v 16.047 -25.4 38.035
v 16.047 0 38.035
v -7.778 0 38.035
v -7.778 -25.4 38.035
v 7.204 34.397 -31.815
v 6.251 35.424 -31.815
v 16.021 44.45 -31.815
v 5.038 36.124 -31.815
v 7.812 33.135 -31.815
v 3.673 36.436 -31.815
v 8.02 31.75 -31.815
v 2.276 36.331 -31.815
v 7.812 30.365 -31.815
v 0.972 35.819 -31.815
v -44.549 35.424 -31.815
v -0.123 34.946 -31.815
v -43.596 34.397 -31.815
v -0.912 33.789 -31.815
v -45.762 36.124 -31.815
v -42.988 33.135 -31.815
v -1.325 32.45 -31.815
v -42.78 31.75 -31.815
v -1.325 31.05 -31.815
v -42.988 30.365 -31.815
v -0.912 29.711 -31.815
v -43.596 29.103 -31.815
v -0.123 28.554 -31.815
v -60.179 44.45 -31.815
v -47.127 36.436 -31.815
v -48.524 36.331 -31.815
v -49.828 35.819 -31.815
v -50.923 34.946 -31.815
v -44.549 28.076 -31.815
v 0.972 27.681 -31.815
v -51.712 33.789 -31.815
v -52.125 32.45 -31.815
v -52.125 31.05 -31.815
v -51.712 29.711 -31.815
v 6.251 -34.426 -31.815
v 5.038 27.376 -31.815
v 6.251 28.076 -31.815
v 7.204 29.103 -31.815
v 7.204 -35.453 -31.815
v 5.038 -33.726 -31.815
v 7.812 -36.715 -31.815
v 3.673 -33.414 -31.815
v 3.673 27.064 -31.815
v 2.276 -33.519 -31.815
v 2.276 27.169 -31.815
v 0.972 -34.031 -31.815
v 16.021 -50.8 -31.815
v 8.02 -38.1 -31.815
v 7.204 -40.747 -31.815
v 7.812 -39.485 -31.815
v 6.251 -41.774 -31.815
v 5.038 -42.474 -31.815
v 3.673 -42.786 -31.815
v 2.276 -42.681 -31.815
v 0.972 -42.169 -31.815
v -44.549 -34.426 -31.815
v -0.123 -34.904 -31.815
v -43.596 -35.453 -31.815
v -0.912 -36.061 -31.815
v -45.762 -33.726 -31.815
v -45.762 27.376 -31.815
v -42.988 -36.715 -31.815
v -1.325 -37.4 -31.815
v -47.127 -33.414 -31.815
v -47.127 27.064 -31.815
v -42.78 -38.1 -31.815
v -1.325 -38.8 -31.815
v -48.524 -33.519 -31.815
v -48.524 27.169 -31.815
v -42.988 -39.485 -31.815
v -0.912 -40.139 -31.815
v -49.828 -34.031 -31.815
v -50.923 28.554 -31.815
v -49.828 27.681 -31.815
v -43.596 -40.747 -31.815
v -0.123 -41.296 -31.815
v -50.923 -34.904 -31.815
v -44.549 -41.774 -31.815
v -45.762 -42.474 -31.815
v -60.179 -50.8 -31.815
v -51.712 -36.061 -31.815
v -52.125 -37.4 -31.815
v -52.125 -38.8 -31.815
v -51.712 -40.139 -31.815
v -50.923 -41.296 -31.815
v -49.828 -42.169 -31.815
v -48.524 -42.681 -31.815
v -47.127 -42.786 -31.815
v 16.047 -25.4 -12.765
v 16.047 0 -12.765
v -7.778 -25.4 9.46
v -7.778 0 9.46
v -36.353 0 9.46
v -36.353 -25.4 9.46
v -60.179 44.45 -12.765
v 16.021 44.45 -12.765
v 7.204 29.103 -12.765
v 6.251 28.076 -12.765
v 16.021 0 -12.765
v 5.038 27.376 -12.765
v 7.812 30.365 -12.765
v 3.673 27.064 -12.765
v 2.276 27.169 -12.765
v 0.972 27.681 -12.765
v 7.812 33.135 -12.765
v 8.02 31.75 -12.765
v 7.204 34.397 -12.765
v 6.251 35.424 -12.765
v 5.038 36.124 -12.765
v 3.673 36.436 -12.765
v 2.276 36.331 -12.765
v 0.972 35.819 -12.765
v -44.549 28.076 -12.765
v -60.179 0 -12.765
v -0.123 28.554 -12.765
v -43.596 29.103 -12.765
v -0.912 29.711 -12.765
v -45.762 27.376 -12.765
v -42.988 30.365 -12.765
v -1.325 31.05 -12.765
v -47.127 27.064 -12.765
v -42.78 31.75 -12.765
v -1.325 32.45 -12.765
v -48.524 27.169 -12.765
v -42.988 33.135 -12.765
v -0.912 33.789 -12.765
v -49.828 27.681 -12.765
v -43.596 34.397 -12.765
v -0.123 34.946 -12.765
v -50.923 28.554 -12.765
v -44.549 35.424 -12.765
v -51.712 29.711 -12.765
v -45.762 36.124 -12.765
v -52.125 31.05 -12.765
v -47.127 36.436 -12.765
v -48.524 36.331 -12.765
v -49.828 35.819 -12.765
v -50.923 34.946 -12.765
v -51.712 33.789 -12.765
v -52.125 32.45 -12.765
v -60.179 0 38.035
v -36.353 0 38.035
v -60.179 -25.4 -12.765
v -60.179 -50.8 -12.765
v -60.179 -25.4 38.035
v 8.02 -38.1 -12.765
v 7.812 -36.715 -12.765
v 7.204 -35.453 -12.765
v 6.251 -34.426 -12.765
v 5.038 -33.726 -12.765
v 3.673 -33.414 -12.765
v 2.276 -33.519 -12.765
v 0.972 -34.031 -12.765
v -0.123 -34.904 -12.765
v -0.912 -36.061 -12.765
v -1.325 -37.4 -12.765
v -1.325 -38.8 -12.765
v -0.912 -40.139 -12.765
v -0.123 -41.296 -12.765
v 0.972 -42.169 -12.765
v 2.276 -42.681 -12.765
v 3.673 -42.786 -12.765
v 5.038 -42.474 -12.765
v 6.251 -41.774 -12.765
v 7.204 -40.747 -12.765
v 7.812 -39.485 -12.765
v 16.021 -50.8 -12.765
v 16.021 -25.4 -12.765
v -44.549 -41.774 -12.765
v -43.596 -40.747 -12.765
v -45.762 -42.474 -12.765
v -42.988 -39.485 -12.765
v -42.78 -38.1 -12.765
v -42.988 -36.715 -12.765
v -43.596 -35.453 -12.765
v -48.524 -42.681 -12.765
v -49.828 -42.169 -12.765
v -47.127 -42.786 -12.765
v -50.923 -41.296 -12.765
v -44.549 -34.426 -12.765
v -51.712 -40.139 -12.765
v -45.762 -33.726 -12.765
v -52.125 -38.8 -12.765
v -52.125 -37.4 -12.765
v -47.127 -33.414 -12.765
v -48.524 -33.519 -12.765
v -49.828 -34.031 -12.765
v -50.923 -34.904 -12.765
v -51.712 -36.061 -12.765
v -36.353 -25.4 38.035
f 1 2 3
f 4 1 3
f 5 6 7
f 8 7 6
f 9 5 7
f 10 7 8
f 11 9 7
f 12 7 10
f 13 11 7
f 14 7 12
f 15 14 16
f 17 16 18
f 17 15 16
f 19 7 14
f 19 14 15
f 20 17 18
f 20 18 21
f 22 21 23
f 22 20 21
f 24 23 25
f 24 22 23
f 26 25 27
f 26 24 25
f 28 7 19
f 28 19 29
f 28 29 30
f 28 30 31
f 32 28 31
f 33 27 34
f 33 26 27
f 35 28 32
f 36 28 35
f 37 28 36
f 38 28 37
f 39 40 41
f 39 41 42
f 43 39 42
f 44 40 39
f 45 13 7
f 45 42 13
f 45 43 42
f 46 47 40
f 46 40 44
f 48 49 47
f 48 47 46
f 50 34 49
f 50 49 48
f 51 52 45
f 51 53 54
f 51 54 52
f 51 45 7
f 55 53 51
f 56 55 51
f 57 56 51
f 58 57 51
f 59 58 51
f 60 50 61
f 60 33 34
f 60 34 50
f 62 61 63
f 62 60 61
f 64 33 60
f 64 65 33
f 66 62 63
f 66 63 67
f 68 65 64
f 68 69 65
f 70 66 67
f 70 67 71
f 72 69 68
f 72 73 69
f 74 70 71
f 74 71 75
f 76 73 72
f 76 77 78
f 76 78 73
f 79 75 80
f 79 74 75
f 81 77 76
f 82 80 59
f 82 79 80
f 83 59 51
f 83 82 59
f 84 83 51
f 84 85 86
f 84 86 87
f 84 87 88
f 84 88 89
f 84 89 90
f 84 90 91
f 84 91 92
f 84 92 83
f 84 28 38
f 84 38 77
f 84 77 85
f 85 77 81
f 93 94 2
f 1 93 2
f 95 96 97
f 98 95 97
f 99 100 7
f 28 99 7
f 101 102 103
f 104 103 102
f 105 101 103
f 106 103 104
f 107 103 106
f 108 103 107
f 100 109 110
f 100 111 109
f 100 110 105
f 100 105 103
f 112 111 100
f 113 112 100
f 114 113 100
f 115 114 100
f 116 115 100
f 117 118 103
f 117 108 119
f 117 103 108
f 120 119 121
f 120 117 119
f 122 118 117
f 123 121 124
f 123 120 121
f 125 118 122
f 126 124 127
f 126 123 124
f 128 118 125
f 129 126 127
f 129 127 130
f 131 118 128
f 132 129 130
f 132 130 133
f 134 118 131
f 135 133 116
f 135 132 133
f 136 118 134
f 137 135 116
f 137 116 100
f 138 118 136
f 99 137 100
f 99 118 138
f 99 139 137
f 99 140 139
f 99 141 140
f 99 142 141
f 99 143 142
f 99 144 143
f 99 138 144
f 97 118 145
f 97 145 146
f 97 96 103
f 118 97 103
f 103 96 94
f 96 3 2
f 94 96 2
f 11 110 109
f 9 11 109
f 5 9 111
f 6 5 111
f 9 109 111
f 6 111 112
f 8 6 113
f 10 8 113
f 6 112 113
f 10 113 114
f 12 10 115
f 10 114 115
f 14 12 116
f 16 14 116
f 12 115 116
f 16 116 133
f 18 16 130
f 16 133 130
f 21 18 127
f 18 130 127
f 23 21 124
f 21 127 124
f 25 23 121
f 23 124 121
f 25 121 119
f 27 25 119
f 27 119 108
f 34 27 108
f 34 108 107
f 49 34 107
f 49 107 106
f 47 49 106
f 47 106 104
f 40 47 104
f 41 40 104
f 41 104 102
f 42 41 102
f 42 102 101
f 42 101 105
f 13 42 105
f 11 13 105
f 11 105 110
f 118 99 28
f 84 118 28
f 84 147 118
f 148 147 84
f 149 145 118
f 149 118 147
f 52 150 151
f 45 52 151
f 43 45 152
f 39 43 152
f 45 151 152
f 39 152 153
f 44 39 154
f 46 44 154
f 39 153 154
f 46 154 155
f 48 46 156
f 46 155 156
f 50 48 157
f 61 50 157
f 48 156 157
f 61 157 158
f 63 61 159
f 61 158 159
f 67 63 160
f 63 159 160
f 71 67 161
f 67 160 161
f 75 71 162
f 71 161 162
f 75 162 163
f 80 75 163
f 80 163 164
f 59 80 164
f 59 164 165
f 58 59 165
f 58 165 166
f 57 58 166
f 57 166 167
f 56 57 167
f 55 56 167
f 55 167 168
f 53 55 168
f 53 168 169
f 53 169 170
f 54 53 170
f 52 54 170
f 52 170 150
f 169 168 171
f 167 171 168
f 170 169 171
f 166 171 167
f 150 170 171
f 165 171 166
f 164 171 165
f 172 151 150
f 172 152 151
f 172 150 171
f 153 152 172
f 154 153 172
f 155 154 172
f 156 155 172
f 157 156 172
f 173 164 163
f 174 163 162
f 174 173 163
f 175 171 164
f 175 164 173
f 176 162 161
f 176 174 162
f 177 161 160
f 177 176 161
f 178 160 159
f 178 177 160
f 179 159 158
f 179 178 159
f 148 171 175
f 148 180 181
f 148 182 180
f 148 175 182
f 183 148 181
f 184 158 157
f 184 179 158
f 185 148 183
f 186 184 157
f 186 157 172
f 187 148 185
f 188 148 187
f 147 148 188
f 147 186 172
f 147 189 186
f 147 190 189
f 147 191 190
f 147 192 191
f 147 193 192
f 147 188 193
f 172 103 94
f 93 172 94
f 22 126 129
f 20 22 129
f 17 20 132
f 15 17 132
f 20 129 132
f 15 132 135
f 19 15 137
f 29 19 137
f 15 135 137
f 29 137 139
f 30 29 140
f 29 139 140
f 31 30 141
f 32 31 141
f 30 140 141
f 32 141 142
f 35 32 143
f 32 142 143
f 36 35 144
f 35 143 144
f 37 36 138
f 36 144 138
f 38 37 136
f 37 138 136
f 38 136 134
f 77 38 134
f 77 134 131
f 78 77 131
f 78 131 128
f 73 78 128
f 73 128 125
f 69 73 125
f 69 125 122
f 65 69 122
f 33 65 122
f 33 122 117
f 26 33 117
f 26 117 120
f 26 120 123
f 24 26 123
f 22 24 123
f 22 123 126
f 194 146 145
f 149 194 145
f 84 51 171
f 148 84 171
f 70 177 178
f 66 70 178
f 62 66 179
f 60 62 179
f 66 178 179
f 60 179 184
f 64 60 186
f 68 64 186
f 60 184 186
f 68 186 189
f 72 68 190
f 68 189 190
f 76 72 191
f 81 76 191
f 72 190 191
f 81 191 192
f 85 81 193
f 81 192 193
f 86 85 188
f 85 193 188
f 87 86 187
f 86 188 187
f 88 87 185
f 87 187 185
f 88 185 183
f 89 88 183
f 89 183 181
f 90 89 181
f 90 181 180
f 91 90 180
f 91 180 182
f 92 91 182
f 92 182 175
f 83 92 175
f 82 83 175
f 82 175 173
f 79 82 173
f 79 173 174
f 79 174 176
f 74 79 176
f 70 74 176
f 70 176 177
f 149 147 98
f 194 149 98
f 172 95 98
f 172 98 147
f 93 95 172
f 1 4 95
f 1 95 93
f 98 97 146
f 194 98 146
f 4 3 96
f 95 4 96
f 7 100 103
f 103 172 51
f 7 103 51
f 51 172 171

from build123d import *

# Parameters (mm, degrees)
F1_DEPTH = 25.4
F3_DEPTH = 76.2
F4_R     = 4.699
F5_DEPTH = 25.4


with BuildPart() as f1:
    # F0 (on Front) → F1 (new body)
    with BuildSketch(Plane.XZ):
        Polygon((-36.353452, 38.035411), (-60.178652, 38.035411), (-60.178652, -12.764589), (16.046748, -12.764589), (16.046748, 38.035411), (-7.778452, 38.035411), (-7.778452, 9.460411), (-36.353452, 9.460411), align=None)
    extrude(amount=F1_DEPTH)

    # F2 (on face) → F3 (join)
    with BuildSketch(Plane(origin=(-60.178652, 0, 0), x_dir=(0, -1, 0), z_dir=(-1, 0, 0))):
        Polygon((50.8, -12.764589), (0, -12.764589), (-44.45, -12.764589), (-44.45, -31.814589), (50.8, -31.814589), align=None)
    extrude(amount=-F3_DEPTH)

    # F4 (on face) → F5 (cut)
    with BuildSketch(Plane.XY.offset(-12.764589)):
        with Locations((3.321348, 31.75)):
            Circle(F4_R)
        with Locations((-47.478652, 31.75)):
            Circle(F4_R)
        with Locations((-47.478652, -38.1)):
            Circle(F4_R)
        with Locations((3.321348, -38.1)):
            Circle(F4_R)
    extrude(amount=-F5_DEPTH, mode=Mode.SUBTRACT)


solid = f1.part
